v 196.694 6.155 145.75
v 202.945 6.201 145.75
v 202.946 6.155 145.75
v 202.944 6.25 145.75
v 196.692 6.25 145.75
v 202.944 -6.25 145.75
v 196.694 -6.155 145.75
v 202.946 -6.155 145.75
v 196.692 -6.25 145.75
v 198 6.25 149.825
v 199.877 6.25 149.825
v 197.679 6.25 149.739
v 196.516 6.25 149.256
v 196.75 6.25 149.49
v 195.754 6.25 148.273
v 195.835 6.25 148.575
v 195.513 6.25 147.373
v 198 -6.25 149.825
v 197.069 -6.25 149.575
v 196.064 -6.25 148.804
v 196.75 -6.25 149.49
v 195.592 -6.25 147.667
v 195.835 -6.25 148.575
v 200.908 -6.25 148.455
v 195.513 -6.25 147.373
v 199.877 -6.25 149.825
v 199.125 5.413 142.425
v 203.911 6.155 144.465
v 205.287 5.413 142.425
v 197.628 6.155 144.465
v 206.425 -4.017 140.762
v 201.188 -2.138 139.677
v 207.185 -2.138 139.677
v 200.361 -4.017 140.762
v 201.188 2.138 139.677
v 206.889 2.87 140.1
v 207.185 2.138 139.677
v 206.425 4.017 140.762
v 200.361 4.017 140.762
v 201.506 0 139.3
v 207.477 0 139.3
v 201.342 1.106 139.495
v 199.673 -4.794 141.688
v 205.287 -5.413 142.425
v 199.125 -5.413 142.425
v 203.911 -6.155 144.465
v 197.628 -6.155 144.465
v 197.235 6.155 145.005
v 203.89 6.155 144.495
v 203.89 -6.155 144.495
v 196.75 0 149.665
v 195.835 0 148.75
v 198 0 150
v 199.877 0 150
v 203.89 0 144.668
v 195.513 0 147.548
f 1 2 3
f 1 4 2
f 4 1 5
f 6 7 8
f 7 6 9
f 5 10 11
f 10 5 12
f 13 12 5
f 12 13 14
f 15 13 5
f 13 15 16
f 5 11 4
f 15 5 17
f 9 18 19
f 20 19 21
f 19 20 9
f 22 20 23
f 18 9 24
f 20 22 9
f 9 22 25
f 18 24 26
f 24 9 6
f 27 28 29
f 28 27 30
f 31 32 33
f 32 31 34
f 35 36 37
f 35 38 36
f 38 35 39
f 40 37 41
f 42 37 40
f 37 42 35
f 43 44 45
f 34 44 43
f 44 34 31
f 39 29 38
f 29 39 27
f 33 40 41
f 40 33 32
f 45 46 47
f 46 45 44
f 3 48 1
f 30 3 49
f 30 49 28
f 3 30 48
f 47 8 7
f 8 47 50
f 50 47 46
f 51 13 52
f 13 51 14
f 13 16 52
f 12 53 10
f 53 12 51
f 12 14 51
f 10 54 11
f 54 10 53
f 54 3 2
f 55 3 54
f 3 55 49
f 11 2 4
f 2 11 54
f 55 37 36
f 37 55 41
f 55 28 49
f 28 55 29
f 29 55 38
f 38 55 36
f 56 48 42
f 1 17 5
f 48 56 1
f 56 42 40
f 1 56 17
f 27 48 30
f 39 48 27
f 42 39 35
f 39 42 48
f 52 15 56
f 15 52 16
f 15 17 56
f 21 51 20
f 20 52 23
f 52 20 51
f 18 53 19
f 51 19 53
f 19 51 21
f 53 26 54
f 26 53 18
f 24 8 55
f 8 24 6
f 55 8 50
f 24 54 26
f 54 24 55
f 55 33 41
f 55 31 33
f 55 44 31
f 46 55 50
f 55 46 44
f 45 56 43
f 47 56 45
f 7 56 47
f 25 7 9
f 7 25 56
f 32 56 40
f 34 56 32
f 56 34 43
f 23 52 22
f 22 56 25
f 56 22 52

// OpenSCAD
// file: ../motors/MN5212.scad
use <../utils.scad>

module MN5212(){

	render(){
		translate([0,0, 42.5 / 2 - 23 / 2 - 4.9 - 6])
			cylinder(
				h = 23,
				r = 59 / 2,
				$fa = fa(59 / 2),
				center = true);
		translate([0,0, 42.5 / 2 - 4.9 / 2 - 6])
			cylinder(
				h = 4.9,
				r1 = 59 / 2,
				r2 = 24.8 / 2,
				$fa = fa(59 / 2),
				center = true);
		translate([0,0, - 42.5 / 2 + 5.6 / 2 + 3])
			cylinder(
				h = 5.6,
				r1 = 44 / 2,
				r2 = 59 / 2,
				$fa = fa(59 / 2),
				center = true);
		translate([0, 0, 42.5 / 2 - 3])
			cylinder(
				h = 6,
				r = 4 / 2,
				$fa = fa(4 / 2),
				center = true);
		translate([0, 0, - 42.5 / 2 + 1.5])
			cylinder(
				h = 3,
				r = 6 / 2,
				$fa = fa(6 / 2),
				center = true);
	}

}
// file: ../servos/HS_5065MG.scad
use <../utils.scad>

module HS_5065MG(){

	length = 23.75;
	width = 11.68;
	depth = 20.32;
	wing_width = 32.38;
	wing_thick = 3.43;
	shaft_offset = 6;
	hole_spacing = 28.32;
	shaft_height = 26.16;
	shaft_length = 2;

	module mounting_hole(){
		mh_rad = 2 / 2;
		translate(
			[
				hole_spacing / 2,
				0,
				depth / 2 - wing_thick / 2
			])
			cylinder(h = 5, r = mh_rad, $fa = fa(mh_rad), center = true);
	}

	difference(){
		union(){
			cube([length, width, depth], center = true);
			translate([0, 0, depth / 2 - wing_thick / 2])
				cube([wing_width, width, wing_thick], center = true);
			translate(
				[
					- length / 2 + shaft_offset,
					0,
					shaft_height - length / 2 + shaft_length / 2
				])
				cylinder(
					h = shaft_length,
					r = 1.5,
					$fa = fa(1.5),
					center = true);
		}	union(){

			mounting_hole();
			mirror() mounting_hole();
		}
	}
}

HS_5065MG();
// file: ../servos/LS_0006_servo.scad
// Author Michael Marques (DrYerzinia)

use <../utils.scad>

module ls_0006_servo(){
	
	length = 21.4;
	depth = 19.9;
	thickness = 11.65;

	gear_height = 2.6;
	gear_bump_height = 0.7;
	gear_bump_diameter = 1.97;
	gear_outer_bump_diameter = 6;
	gear_bump_offset = 12.2;

	shaft_height = 2.4;
	shaft_diameter = 3.74;
	shaft_offset = thickness / 2;
	shaft_screw_diameter = 1.3;
	
	wing_outer_width = 8.5;
	wing_top_off = 3.8;
	wing_length = 3.8;
	wing_thickness = 1.2;
	wing_hole_diameter = 1.85;
	wing_hole_edge_dist = 2;

	module wing_hole(){
		translate(
			[
				length / 2 + wing_hole_edge_dist,
				0,
				depth/2 - wing_top_off - wing_thickness / 2
			])
			cylinder(
				h = wing_thickness + 1,
				r = wing_hole_diameter / 2,
				$fn = 16,
				center = true);
	}

	module wing(){
		translate(
			[
				length / 2,
				thickness / 2,
				depth/2 - wing_top_off - wing_thickness
			])
			rotate([0,0,-90])
				trapezoid(
					thickness,
					wing_outer_width,
					wing_length,
					wing_thickness);
	}

	// Body
	cube([length, thickness, depth], center = true);

	difference(){
		union(){

			wing();
			mirror() wing();

			// Gear Bumps
			translate([0, 0, depth/2 + gear_height / 2]){
				translate([length / 2 - gear_bump_offset, 0, 0])
					cylinder(
						h = gear_height,
						r = gear_outer_bump_diameter / 2,
						$fn = 16,
						center = true);
				translate([length / 2 - gear_bump_offset, 0, gear_height/2 + gear_bump_height / 2])
					cylinder(
						h = gear_bump_height,
						r = gear_bump_diameter / 2,
						$fn = 16,
						center = true);
				translate([length / 2 - shaft_offset, 0, 0])
					cylinder(
						h = gear_height,
						r = thickness / 2,
						$fn = 32,
						center = true);
				// Shaft
				translate([length / 2 - shaft_offset, 0, gear_height])
					cylinder(
						h = shaft_height,
						r = shaft_diameter / 2,
						$fn = 16,
						center = true);
			}

		}
		union(){

			wing_hole();
			mirror() wing_hole();

			// Shaft_hole
			translate(
				[
					length / 2 - shaft_offset,
					0,
					depth/2 + gear_height * (3 / 2) + 0.5])
				cylinder(
					h = shaft_height + 1,
					r = shaft_screw_diameter / 2,
					$fn = 16,
					center = true);

		}
	}

}

module translate_ls_0006_attachment(){

	length = 21.4;
	thickness = 11.65;
	shaft_offset = thickness / 2;
	depth = 19.9;
	float = 3.3;

	translate([length / 2 - shaft_offset, 0, depth / 2 + float])
		children();

}

module bar_attachment(){

	height = 3.75;
	bar_length = 14.7;
	bar_thickness = 1.6;
	inner_radius = 5.9;
	outer_radius = 3.95;
	shaft_diameter = 3.7;
	upper_void_diameter = 4.8;
	screw_diameter = 2;
	hole_spacing = 2;
	hole_4_diameter = 1.2;
	hole_diameter = 1;
	hole_start_off = 4.7;
	top_void_depth = 0.67;
	bottom_void_depth = 1.84;

	translate([0, 0, height / 2]){
		difference(){
			union(){

				translate([0, inner_radius / 2, height / 2 - bar_thickness])
					rotate([0,0,-90])
						trapezoid(
							inner_radius,
							outer_radius,
							bar_length,
							bar_thickness);

				cylinder(
					h = height,
					r = inner_radius / 2,
					$fn = 16,
					center = true);

				translate([bar_length, 0, height / 2 - bar_thickness / 2])
					cylinder(
						h = bar_thickness,
						r = outer_radius / 2,
						$fn = 16,
						center = true);

			}
			union(){
				// screwhole
				cylinder(
					h = height + 1,
					r = screw_diameter / 2,
					$fn = 16,
					center = true);
				// voids
				translate([0, 0, height / 2 - top_void_depth / 2 + 0.5])
					cylinder(
						h = top_void_depth + 1,
						r = upper_void_diameter / 2,
						$fn = 16,
						center = true);
				translate([0, 0,  - bottom_void_depth / 2 - 0.5])
					cylinder(
						h = bottom_void_depth + 1,
						r = shaft_diameter / 2,
						$fn = 16,
						center = true);

				for(i = [0:4]){
					dia = (i != 3) ? hole_diameter : hole_4_diameter;
					translate(
						[
							hole_start_off + hole_spacing * i,
							0,
							height / 2 - bar_thickness / 2])
						cylinder(
							h = bar_thickness + 1,
							r = dia / 2,
							$fn = 16,
							center = true);
				}

			}
		}
	}

}

ls_0006_servo();
translate_ls_0006_attachment() bar_attachment();
// file: ../servos/parallax_continuous_rotation_servo.scad
// Author Michael Marques (DrYerzinia)

module parallax_continuous_rotation_servo(){

	depth = 37.7;
	length = 40.75;
	width = 19.75;

	mount_height = 2.7;
	mount_extent = 6.1;
	mount_from_top = 7.7;

	mount_hole_diameter = 4.46;
	mount_hole_spacing = 14.4 - mount_hole_diameter;

	shaft_diameter = 5.8;
	shaft_offset = 10;
	shaft_length = 3.5;

	module mounting_hole(){

			translate(
				[
					length / 2 + 5,
					mount_hole_spacing / 2,
					depth / 2 - mount_height / 2 - mount_from_top
				]
				)
				cylinder(
					h = mount_height + 1,
					r = mount_hole_diameter / 2,
					$fn=16,
					center = true);
	}

	difference(){
		union(){

			// Body
			cube([length,width,depth], center = true);

			// Mounting wings
			translate(
				[
					0,
					0,
					depth / 2 - mount_height / 2 - mount_from_top
				])
				cube(
					[
						length + mount_extent * 2,
						width,
						mount_height
					],
					center = true);

			// Shaft
			translate(
				[
					length / 2 - shaft_offset,
					0,
					depth / 2 + shaft_length / 2
				]
				)
				cylinder(
					h = shaft_length,
					r = shaft_diameter / 2,
					$fn = 16,
					center = true
				);

		}
		union(){

			// Mounting Holes
			mounting_hole();
			mirror()
				mounting_hole();

			translate([0,-mount_hole_spacing,0]){
				mounting_hole();
				mirror()
					mounting_hole();
			}
		}
	}

}

module translate_shaft(){

	depth = 37.7;
	length = 40.75;

	shaft_offset = 10;

	translate(
		[
			length / 2 - shaft_offset,
			0,
			depth / 2
		])
		children();
}

module round_servo_attachment(){

	height = 6;
	diameter = 20.8;
	inner_diameter = 8.6;
	plate_thickness = 2.45;

	float = 2;

	depth = 37.7;
	length = 40.75;

	shaft_offset = 10;

	plate_hole_spacing = 14.5;
	plate_hole_diameter = 1.4;
	plate_hole_minor_spacing = 3.5;

	screw_hole_diameter = 3;

	inner_diameter = 8;
	
	top_depth = 1.8;
	bottom_depth = 3.4;

	void_diameter = 5.8;

	module plate_hole(){
		cylinder(
			h = plate_thickness + 1,
			r = plate_hole_diameter / 2,
			$fn = 16,
			center = true
		);
	}

	module plate_hole_group(){
		translate([0, 0, height / 2 - plate_thickness / 2]){
			translate([0, plate_hole_spacing / 2, 0]){
					plate_hole();
					translate([- plate_hole_minor_spacing, 0, 0])
						plate_hole();
					translate([  plate_hole_minor_spacing, 0, 0])
						plate_hole();
			}
		}
	}

	translate(
		[
			length / 2 - shaft_offset,
			0,
			depth / 2 + height / 2 + float
		]
		)
		difference(){

			union(){

				// inner shaft
				cylinder(
					h = height,
					r = inner_diameter / 2,
					$fn = 16,
					center = true
				);

				// top
				translate([0, 0, height / 2 - plate_thickness / 2])
					cylinder(
						h = plate_thickness,
						r = diameter / 2,
						$fn = 32,
						center = true
					);
			}

			union(){

				// plate holes
				for(ang = [0:3]){
					rotate([0,0, ang * 90])
						plate_hole_group();
				}

				// screw hole
				cylinder(
					h = height + 1,
					r = screw_hole_diameter / 2,
					$fn = 16,
					center = true
				);

				// inner voids
				translate([0, 0, height / 2 - top_depth / 2 + 1])
					cylinder(
						h = top_depth + 1,
						r = void_diameter / 2,
						$fn = 16,
						center = true
					);
				translate([0, 0, -1])
					cylinder(
						h = bottom_depth + 1,
						r = void_diameter / 2,
						$fn = 16,
						center = true
					);

			}

		}

}

parallax_continuous_rotation_servo();
round_servo_attachment();
// file: ../hardware.scad
 // Author Michael Marques (DrYerzinia)

// http://www.ebay.com/itm/10-PCS-683-3x7x2-mm-Metal-OPEN-PRECISION-Miniature-Ball-Bearing-3-7-2-/291206307942?hash=item43cd3fa066:m:mCi6eovrGVk_CjIUjlhw8yg
// E-Bay empire.rc

module washer_M3_7x3_2x0_5mm(){

	difference(){
		cylinder(
			h = 0.5,
			r = 7 / 2,
			$fn = 16,
			center = true);
		cylinder(
			h = 0.5 + 0.1,
			r = 3.2 / 2,
			$fn = 16,
			center = true);
	}

}

module bearing_3x7x2mm(){

	difference(){
		cylinder(
			h = 2,
			r = 7 / 2,
			$fn = 16,
			center = true);
		cylinder(
			h = 2 + 1,
			r = 3 / 2,
			$fn = 16,
			center = true);
	}

}

module bearing_5x8x2_5mm(){

	difference(){
		cylinder(
			h = 2.5,
			r = 8 / 2,
			$fn = 16,
			center = true);
		cylinder(
			h = 2.5 + 1,
			r = 5 / 2,
			$fn = 16,
			center = true);
	}

}

module bearing_8x16x5mm(){

	difference(){
		cylinder(
			h = 5,
			r = 16 / 2,
			$fn = 16,
			center = true);
		cylinder(
			h = 5 + 1,
			r = 8 / 2,
			$fn = 16,
			center = true);
	}

}


bearing_5x8x2_5mm();
// file: ../utils.scad
// http://forum.openscad.org/Creating-pie-pizza-slice-shape-need-a-dynamic-length-array-td3148.html

module pie_slice(r, start_angle, end_angle) {
    R = r * sqrt(2) + 1;
    a0 = (4 * start_angle + 0 * end_angle) / 4;
    a1 = (3 * start_angle + 1 * end_angle) / 4;
    a2 = (2 * start_angle + 2 * end_angle) / 4;
    a3 = (1 * start_angle + 3 * end_angle) / 4;
    a4 = (0 * start_angle + 4 * end_angle) / 4;
    if(end_angle > start_angle)
        intersection() {
        circle(r, $fa = fa(r));
        polygon([
            [0,0],
            [R * cos(a0), R * sin(a0)],
            [R * cos(a1), R * sin(a1)],
            [R * cos(a2), R * sin(a2)],
            [R * cos(a3), R * sin(a3)],
            [R * cos(a4), R * sin(a4)],
            [0,0]
       ]);
    }
}

// https://github.com/openscad/openscad/issues/29

module rotate_about(v,a) {
	translate(v) rotate(a) translate(-v) children(0);
}

module rotate_about_axis(v, ang, axis) {
	translate(v) rotate(ang, axis) translate(-v) children(0);
}

// https://github.com/robofun/openscad-utils/blob/master/trapezoid.scad

module trapezoid(width_base, width_top,height,thickness) {
	

  linear_extrude(height = thickness) polygon(points=[[0,0],[width_base,0],[width_base-(width_base-width_top)/2,height],[(width_base-width_top)/2,height]], paths=[[0,1,2,3]]); 
  
}

// http://forum.openscad.org/fe-Tolerance-based-arc-approximation-td14212.html

function fa(r)=($fn>0)?360/$fn:($fe>0)?($fe<r)?min(45,2*acos(1-$fe/r)):45:$fa; 
// file: ../render_settings.scad
// Author Michael Marques (DrYerzinia)

// Lulzbot Mini tolerances
// x/y 0.1mm
// z   0.05mm
//
// 0.1mm   preview tolerance
// 0.025mm export  tolerance

$fs = 0.01;
$fn = undef;
$fa = 360 / 5;

$fe = 0.025;	// export
// main file
// Author Michael Marques (DrYerzinia)

include <../render_settings.scad>

use <../BB8.scad>

Door_P5();
